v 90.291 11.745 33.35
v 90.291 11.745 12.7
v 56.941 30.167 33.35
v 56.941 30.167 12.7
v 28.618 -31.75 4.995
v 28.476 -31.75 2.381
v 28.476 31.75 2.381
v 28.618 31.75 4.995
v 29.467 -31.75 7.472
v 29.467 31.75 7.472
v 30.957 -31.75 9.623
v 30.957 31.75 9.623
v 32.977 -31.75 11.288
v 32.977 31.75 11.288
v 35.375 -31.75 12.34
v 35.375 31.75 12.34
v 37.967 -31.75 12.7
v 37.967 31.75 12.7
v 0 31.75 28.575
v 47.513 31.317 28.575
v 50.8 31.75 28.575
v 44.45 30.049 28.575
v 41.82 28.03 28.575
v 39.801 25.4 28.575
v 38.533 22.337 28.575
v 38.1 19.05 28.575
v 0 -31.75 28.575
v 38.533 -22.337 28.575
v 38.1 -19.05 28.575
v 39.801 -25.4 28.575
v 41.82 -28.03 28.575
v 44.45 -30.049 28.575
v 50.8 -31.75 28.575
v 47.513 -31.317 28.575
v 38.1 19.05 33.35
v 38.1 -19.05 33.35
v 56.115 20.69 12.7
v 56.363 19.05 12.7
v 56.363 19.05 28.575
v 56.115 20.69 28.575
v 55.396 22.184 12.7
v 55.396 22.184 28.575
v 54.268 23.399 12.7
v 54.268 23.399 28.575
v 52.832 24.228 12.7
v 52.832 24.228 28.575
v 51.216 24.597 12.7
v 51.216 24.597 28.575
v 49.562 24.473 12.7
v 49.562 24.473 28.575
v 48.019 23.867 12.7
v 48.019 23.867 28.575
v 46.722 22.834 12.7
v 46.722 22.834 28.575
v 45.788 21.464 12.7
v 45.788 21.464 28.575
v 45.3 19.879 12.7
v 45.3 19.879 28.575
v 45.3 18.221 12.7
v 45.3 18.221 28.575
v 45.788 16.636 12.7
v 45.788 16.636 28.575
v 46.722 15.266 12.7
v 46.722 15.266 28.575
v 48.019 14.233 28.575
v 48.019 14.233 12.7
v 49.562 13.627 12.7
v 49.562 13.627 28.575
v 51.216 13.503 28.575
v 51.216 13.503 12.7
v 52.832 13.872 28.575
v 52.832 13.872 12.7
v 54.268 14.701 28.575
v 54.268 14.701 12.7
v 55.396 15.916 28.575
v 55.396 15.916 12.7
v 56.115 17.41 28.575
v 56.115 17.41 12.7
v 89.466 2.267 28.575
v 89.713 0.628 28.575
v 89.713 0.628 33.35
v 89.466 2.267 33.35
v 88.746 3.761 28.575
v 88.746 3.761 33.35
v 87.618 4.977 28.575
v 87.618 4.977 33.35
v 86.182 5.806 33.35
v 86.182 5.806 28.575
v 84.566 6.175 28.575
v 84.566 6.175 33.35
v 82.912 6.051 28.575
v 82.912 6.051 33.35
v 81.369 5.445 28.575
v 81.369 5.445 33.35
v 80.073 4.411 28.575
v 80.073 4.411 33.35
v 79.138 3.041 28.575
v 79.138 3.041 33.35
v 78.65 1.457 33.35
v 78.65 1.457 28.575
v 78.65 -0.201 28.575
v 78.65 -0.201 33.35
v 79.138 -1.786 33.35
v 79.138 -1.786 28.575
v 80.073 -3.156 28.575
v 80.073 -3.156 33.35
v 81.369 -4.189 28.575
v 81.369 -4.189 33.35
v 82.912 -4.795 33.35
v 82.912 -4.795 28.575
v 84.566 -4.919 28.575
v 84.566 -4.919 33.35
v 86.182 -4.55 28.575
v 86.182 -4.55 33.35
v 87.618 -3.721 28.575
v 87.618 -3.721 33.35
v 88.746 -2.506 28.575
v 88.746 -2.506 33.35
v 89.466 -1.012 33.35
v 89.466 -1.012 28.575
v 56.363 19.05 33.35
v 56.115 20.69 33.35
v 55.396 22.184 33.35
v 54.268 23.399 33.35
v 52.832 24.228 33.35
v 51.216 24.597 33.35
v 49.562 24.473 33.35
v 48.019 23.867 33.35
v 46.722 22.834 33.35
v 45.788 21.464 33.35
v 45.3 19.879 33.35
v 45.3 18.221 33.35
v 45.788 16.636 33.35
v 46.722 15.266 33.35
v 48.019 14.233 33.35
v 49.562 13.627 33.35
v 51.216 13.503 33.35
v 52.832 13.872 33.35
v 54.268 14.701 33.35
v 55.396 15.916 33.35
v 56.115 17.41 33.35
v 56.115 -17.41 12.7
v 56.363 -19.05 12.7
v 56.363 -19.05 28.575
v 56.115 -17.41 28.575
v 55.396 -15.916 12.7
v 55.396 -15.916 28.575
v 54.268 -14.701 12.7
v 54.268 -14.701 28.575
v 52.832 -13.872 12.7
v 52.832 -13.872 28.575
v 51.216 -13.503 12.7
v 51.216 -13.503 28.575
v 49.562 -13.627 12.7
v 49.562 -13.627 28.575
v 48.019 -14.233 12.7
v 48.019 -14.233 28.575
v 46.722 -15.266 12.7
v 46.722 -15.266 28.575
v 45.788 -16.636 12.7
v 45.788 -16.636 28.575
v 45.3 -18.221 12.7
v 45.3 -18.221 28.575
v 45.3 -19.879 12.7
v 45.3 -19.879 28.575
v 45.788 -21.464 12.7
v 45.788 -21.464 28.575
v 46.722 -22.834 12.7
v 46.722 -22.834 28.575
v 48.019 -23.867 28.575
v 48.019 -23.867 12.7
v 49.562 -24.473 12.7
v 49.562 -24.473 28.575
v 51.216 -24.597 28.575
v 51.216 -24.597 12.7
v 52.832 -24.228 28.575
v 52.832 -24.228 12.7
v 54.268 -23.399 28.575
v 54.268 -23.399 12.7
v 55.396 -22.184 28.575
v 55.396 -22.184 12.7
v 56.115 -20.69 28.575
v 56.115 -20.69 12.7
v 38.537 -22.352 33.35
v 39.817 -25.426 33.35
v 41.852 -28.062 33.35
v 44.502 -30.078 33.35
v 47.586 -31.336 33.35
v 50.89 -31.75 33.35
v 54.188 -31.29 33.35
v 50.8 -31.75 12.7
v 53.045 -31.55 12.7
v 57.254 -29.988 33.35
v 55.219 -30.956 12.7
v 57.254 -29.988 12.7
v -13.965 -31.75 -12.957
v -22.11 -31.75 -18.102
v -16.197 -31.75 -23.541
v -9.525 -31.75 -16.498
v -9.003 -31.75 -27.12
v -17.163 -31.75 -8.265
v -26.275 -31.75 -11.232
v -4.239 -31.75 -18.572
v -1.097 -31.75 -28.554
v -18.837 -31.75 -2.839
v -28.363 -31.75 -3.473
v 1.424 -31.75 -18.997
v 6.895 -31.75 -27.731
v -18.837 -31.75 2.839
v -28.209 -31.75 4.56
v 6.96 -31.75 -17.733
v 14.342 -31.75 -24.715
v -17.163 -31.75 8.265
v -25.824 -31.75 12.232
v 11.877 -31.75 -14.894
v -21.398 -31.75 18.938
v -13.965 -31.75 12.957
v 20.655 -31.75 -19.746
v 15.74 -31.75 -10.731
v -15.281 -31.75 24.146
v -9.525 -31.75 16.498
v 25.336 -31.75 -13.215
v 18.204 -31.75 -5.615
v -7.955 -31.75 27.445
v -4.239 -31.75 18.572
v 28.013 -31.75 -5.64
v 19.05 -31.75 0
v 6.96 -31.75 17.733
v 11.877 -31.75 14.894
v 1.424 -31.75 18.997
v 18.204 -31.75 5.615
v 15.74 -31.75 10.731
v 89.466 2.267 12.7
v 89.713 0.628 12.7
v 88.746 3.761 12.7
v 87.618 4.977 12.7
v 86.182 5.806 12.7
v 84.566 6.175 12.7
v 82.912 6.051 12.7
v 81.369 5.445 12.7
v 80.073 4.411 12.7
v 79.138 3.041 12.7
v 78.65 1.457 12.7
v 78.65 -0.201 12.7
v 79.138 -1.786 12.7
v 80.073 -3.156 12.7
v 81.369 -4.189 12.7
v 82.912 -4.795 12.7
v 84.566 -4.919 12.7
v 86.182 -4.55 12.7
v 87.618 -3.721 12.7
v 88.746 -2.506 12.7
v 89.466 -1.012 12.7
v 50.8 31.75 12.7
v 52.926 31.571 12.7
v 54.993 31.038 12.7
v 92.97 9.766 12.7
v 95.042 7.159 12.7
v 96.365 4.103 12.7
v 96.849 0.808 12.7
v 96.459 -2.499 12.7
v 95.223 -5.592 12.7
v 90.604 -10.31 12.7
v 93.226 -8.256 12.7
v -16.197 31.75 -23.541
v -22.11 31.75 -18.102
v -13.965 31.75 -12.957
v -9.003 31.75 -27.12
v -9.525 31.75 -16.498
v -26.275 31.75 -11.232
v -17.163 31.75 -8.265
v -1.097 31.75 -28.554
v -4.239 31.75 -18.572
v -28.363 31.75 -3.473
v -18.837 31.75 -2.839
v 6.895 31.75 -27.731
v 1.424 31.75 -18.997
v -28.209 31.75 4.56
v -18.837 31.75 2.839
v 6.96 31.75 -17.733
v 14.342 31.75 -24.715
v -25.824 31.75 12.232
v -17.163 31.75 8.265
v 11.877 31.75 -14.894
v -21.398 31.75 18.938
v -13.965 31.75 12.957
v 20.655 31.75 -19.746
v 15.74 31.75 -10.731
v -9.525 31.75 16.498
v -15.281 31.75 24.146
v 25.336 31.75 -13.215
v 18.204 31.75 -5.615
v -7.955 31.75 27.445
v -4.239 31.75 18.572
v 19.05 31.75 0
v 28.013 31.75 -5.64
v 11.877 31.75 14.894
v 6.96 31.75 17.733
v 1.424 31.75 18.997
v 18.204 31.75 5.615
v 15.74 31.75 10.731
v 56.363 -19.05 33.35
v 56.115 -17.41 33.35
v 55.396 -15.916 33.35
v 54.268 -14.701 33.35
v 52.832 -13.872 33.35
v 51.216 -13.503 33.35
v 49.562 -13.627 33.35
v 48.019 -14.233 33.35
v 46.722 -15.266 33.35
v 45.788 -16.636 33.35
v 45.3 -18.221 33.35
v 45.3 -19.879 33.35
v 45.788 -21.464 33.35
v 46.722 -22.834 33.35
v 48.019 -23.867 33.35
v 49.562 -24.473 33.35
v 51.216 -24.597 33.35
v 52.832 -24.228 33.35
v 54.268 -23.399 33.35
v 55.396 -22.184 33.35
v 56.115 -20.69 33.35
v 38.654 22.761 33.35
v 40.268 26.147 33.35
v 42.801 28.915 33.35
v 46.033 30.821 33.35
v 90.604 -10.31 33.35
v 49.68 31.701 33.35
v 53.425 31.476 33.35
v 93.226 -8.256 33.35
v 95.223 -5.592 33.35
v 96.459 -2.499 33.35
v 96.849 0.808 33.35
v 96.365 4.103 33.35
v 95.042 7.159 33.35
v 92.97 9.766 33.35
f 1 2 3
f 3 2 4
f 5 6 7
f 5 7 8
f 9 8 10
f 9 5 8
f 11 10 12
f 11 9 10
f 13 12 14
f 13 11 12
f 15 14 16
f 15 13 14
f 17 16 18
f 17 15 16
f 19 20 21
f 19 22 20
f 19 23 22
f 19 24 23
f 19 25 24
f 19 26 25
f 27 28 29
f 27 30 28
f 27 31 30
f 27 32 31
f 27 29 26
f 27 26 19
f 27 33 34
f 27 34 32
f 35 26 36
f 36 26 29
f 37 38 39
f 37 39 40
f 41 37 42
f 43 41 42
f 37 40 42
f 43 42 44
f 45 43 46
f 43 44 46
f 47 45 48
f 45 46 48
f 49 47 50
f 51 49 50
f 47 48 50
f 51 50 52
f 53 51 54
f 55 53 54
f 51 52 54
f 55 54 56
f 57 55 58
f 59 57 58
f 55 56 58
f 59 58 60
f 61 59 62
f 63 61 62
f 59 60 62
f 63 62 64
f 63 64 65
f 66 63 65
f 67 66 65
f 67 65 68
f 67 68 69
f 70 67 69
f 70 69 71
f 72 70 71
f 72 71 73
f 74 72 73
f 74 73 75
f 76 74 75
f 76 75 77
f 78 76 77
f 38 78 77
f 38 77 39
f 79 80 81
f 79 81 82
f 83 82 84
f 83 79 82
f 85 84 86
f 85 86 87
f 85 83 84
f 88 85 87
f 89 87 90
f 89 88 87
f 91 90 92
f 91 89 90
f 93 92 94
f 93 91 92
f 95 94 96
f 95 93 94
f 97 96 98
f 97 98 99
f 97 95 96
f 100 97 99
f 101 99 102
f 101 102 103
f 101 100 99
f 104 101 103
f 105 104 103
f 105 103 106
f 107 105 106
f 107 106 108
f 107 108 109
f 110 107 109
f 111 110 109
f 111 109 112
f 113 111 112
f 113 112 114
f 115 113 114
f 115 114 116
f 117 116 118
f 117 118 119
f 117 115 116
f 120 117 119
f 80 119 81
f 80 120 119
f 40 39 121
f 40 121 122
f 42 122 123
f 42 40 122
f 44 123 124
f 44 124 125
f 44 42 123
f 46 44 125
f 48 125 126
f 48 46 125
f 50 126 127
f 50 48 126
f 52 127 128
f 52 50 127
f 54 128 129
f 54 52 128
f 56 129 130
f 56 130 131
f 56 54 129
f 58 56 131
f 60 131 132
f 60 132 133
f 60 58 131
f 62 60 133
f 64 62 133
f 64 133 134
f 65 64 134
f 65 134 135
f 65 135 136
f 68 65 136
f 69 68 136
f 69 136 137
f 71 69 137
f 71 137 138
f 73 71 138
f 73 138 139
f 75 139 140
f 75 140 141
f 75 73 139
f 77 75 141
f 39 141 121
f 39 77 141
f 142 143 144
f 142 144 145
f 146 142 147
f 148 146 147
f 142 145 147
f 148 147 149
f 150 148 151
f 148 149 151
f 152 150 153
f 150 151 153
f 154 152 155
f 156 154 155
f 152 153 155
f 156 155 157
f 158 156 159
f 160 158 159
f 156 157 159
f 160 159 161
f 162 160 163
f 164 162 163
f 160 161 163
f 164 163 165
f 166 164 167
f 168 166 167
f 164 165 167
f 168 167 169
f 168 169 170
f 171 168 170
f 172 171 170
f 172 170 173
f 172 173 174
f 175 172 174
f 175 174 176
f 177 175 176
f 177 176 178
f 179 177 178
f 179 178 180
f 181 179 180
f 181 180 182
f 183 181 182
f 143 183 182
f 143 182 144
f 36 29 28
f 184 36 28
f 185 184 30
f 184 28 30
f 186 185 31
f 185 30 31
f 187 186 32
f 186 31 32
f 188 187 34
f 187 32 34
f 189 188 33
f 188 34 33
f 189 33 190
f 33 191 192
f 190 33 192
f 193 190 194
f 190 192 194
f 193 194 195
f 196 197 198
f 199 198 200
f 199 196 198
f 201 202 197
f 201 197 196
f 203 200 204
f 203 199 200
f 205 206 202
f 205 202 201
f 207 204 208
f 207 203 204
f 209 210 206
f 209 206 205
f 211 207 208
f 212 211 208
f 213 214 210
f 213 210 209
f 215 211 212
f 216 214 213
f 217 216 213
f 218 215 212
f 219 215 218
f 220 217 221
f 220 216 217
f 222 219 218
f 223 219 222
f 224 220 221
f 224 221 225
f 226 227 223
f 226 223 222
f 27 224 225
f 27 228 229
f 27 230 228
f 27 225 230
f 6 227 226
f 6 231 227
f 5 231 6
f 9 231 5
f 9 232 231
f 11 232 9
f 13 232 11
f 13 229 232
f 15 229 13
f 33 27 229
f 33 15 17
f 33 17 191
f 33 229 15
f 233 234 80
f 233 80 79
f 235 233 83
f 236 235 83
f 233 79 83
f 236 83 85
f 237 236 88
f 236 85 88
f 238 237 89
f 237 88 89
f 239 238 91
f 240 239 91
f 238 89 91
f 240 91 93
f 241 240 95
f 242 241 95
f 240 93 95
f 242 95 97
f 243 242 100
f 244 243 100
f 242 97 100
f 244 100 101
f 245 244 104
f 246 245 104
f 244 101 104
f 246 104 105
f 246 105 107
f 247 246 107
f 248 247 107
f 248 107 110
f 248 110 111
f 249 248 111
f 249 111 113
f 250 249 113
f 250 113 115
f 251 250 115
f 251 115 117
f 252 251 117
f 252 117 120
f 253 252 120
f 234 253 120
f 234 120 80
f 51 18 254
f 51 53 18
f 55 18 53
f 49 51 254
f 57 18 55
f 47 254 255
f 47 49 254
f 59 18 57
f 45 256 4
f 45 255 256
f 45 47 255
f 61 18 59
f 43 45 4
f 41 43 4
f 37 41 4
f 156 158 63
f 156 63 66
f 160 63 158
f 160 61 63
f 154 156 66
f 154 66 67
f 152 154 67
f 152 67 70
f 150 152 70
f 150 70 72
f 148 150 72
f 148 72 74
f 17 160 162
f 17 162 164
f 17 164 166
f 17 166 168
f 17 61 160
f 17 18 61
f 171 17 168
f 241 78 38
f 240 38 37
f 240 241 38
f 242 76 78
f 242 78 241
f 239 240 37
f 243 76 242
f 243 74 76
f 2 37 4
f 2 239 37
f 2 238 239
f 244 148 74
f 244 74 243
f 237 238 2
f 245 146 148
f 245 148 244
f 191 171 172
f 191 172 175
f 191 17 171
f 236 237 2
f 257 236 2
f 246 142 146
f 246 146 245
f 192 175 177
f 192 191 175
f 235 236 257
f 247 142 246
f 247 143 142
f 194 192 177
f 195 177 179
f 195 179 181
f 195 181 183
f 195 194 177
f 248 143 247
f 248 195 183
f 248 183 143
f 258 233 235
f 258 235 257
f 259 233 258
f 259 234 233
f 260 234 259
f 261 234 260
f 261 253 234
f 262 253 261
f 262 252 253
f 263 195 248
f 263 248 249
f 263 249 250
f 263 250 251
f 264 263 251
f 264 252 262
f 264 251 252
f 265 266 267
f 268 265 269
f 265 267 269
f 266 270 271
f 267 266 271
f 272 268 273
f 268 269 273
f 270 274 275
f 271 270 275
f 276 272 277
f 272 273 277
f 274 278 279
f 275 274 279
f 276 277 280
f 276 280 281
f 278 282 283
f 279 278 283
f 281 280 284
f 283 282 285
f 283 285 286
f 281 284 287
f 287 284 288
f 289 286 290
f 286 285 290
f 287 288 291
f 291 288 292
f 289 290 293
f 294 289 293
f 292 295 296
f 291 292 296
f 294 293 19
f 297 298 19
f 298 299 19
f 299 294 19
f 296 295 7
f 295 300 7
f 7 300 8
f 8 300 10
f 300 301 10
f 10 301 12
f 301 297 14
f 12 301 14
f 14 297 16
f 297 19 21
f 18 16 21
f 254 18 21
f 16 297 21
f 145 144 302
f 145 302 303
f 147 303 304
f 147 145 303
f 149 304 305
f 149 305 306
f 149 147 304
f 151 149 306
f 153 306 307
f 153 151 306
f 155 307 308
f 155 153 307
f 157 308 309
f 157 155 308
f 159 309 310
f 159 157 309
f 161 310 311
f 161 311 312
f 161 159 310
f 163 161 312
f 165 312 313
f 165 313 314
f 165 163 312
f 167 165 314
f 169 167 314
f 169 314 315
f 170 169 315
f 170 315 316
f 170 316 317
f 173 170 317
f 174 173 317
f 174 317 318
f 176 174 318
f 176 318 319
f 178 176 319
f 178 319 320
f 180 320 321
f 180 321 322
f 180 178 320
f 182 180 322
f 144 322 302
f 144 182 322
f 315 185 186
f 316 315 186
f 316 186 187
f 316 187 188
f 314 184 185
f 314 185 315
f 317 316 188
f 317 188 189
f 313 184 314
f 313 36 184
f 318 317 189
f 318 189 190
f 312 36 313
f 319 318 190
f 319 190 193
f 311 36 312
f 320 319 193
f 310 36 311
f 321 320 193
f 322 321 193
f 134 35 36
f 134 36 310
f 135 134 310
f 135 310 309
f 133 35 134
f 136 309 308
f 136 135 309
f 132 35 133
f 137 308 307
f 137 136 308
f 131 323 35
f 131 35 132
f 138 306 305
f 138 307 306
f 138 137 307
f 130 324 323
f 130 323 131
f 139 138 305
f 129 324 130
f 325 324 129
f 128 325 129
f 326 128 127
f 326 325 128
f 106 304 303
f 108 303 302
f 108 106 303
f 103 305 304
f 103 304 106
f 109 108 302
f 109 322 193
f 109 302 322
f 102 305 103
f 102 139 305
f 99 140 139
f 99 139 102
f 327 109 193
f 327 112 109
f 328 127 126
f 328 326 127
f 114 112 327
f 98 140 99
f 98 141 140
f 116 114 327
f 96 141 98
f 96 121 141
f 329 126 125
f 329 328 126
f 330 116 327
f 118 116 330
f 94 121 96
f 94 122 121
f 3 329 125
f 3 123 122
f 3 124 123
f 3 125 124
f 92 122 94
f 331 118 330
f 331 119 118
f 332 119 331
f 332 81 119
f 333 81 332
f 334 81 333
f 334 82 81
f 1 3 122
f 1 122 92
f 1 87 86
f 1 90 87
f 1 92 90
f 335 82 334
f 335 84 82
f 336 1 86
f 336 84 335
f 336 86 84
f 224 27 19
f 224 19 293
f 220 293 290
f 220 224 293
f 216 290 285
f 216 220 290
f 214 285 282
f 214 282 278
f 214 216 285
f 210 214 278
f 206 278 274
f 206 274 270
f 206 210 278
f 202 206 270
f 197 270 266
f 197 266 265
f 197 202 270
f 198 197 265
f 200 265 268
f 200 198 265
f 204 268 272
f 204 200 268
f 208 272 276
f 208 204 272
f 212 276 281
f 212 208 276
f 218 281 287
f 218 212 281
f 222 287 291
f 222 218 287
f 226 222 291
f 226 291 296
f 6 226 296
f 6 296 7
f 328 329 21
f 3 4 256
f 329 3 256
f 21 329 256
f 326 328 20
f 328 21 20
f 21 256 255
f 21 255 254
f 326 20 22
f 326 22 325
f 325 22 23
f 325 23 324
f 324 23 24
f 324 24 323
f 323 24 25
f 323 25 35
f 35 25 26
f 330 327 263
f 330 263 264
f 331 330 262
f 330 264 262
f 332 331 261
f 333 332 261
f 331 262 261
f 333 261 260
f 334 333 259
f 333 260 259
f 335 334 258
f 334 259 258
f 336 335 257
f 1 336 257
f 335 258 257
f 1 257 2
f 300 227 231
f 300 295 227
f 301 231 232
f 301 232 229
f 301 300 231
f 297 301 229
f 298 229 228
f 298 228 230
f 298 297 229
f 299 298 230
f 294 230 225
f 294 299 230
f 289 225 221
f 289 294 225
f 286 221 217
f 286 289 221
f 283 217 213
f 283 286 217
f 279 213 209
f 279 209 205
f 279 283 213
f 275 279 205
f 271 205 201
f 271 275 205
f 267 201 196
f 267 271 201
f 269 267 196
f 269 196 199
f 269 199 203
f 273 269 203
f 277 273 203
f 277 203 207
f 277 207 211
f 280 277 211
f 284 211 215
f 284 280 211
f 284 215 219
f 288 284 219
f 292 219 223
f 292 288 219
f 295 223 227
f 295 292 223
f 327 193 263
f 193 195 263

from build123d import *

# Parameters (mm, degrees)
F0_R     = 19.05
F1_DEPTH = 31.75
F2_R     = 5.5626
F3_DEPTH = 4.7752
F4_DEPTH = 57.151


with BuildPart() as f1:
    # F0 (on Front) → F1 (new body, symmetric)
    with BuildSketch(Plane.XZ):
        with BuildLine():
            Line((139.5674778593, 28.575), (0, 28.575))
            ThreePointArc((0, 28.575), (-19.345366451, -21.0306305629), (28.4756083945, 2.38125))
            ThreePointArc((28.4756083945, 2.38125), (30.9572676717, 9.6234554837), (37.9674778593, 12.7))
            Line((37.9674778593, 12.7), (139.5674778593, 12.7))
            Line((139.5674778593, 12.7), (139.5674778593, 28.575))
        make_face()
        Circle(F0_R, mode=Mode.SUBTRACT)
    extrude(amount=F1_DEPTH, both=True)

    # F2 (on face) → F3 (join)
    with BuildSketch(Plane.XY.offset(28.575)):
        with BuildLine():
            ThreePointArc((56.9407035424, 30.1667333333), (44.3462001498, 29.9879370767), (38.1, 19.05))
            Line((38.1, 19.05), (38.1, -19.05))
            ThreePointArc((38.1, -19.05), (44.5021137711, -30.078446357), (57.2537998502, -29.9879370767))
            Line((57.2537998502, -29.9879370767), (90.6039998502, -10.3100477039))
            ThreePointArc((90.6039998502, -10.3100477039), (96.8489204336, 0.8081651333), (90.2909035424, 11.7446227062))
            Line((90.2909035424, 11.7446227062), (56.9407035424, 30.1667333333))
        make_face()
        with Locations((50.8, -19.05)):
            Circle(F2_R, mode=Mode.SUBTRACT)
        with Locations((50.8, 19.05)):
            Circle(F2_R, mode=Mode.SUBTRACT)
        with Locations((84.1502, 0.6278893728)):
            Circle(F2_R, mode=Mode.SUBTRACT)
    extrude(amount=F3_DEPTH)

    # F4 (cut, through all): faces of the model
    f4_faces = [f1.faces().sort_by_distance(p)[0] for p in [
        (50.8, 19.05, 28.575),
        (84.1502, 0.6278893728, 28.575),
        (50.8, -19.05, 28.575),
        (108.2569186548, -0.1131496347, 28.575),
    ]]
    extrude(f4_faces, amount=-F4_DEPTH, mode=Mode.SUBTRACT)


solid = f1.part
